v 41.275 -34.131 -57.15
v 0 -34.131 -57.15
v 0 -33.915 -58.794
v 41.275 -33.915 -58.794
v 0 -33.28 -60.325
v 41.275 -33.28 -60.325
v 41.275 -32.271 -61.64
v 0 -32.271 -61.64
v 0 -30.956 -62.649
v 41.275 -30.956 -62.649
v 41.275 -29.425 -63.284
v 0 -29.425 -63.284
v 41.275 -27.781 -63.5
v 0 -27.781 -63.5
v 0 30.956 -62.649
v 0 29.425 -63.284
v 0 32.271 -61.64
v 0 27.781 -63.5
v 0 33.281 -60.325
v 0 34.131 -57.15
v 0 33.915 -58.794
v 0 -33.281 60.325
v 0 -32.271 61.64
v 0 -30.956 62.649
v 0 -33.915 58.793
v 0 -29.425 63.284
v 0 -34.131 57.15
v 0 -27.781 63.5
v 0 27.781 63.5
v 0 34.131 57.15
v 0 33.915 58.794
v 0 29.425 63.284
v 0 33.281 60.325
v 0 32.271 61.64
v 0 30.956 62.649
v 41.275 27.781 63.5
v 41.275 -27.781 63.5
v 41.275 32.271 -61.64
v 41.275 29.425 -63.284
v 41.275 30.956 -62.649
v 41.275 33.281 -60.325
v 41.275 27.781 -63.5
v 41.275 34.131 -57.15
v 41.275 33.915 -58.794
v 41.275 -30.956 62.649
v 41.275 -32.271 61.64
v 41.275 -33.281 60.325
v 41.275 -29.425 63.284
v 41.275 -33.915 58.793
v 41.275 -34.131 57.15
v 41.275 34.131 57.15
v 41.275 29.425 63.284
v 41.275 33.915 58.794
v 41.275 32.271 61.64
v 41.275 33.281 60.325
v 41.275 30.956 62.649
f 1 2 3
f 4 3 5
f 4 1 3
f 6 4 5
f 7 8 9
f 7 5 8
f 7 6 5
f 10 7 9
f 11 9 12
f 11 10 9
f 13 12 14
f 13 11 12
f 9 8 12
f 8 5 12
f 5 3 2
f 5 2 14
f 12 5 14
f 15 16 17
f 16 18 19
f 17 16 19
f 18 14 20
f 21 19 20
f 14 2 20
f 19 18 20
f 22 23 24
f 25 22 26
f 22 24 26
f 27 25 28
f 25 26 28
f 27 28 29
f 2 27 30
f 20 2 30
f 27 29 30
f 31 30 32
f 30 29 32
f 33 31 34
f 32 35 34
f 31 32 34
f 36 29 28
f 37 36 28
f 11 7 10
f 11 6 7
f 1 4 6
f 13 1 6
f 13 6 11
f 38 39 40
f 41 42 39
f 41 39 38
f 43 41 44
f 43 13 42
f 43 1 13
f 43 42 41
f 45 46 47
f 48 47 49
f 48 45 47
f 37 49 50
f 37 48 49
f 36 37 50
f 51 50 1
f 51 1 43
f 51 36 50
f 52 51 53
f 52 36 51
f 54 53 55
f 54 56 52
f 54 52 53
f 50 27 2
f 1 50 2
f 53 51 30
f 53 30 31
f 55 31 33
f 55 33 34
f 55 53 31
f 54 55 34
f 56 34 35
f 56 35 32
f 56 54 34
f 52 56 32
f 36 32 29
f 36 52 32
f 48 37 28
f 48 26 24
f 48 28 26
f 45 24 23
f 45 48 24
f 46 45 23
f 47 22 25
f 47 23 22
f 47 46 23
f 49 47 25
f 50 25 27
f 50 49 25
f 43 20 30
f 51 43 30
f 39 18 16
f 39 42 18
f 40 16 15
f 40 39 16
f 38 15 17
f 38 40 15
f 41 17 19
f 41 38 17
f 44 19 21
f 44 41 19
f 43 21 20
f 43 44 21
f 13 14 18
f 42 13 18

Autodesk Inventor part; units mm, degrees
ref_plane "YZ Plane" through (0, 0, 0) normal (1, 0, 0) x (0, 1, 0)
sketch "Sketch1" plane through (0, 0, 0) normal (1, 0, 0) x (0, 1, 0)
  line L0 (34.1313, 63.5) -> (-34.1313, 63.5)
  line L1 (-34.1313, 63.5) -> (-34.1312, -63.5)
  line L2 (-34.1312, -63.5) -> (34.1313, -63.5)
  line L3 (34.1313, -63.5) -> (34.1313, 63.5)
  line L4 (-47.7838, 0) -> (47.7838, 0) construction
  line L5 (0, -88.9) -> (0, 88.9) construction
  point P0 (0, 0)
  dimension "d0" = 127
  dimension "d1" = 68.2625
extrude "Extrusion1" add sketch "Sketch1" along normal blind 41.275
fillet "Fillet1" radius 6.35 4 edges at (20.6375, 34.1313, 63.5) (20.6375, 34.1313, -63.5) (20.6375, -34.1313, 63.5) (20.6375, -34.1312, -63.5)
sketch "Motor Attachment" plane through (41.275, 0, 0) normal (1, 0, 0) x (0, 0, -1)
  line L0 (63.5, -27.7812) -> (63.5, 27.7813) construction
  line L1 (57.15, 34.1313) -> (-57.15, 34.1313) construction
  line L2 (-57.15, -34.1313) -> (57.15, -34.1312) construction
  line L3 (63.5, -27.7812) -> (63.5, 27.7813) construction
  line L4 (63.5, 0) -> (-63.5, 0) construction
  line L5 (-63.5, 27.7813) -> (-63.5, -27.7813) construction
  line L6 (57.15, 34.1313) -> (-57.15, 34.1313) construction
  line L7 (25.4, 34.1313) -> (25.4, -34.1312) construction
  point P0 (0, 0)
  point P1 (25.4, 0)
  dimension "d5" = 38.1
sketch "Axle Attachment" plane through (0, 0, 0) normal (-1, 0, 0) x (0, 0, 1)
  line L0 (-57.15, 34.1313) -> (57.15, 34.1313) construction
  line L1 (57.15, -34.1313) -> (-57.15, -34.1312) construction
  line L2 (63.5, 27.7813) -> (63.5, -27.7813) construction
  line L3 (-63.5, -27.7812) -> (-63.5, 27.7813) projected
  line L4 (-63.5, 0) -> (63.5, 0) construction
  line L5 (33.3375, 34.1313) -> (33.3375, -34.1313) construction
  point P0 (0, 0)
  point P1 (33.3375, 0)
  dimension "d6" = 30.1625
ref_plane "Work Plane1" through (0, 0, 33.3375) normal (0, -1, 0) x (1, 0, 0)
sketch "Axle Axis" plane through (0, 0, 33.3375) normal (0, -1, 0) x (1, 0, 0)
  line L0 (0, 0) -> (-15.5629, 0)
  point P0 (0, -33.3375)
ref_plane "Work Plane2" through (41.275, 0, -25.4) normal (0, -1, 0) x (1, 0, 0)
sketch "Motor Axis" plane through (41.275, 0, -25.4) normal (0, -1, 0) x (1, 0, 0)
  line L0 (0, 0) -> (10.3767, 0)
  point P0 (-41.275, 25.4)
properties part number "am-2679 671 Mecanum Gearbox"
